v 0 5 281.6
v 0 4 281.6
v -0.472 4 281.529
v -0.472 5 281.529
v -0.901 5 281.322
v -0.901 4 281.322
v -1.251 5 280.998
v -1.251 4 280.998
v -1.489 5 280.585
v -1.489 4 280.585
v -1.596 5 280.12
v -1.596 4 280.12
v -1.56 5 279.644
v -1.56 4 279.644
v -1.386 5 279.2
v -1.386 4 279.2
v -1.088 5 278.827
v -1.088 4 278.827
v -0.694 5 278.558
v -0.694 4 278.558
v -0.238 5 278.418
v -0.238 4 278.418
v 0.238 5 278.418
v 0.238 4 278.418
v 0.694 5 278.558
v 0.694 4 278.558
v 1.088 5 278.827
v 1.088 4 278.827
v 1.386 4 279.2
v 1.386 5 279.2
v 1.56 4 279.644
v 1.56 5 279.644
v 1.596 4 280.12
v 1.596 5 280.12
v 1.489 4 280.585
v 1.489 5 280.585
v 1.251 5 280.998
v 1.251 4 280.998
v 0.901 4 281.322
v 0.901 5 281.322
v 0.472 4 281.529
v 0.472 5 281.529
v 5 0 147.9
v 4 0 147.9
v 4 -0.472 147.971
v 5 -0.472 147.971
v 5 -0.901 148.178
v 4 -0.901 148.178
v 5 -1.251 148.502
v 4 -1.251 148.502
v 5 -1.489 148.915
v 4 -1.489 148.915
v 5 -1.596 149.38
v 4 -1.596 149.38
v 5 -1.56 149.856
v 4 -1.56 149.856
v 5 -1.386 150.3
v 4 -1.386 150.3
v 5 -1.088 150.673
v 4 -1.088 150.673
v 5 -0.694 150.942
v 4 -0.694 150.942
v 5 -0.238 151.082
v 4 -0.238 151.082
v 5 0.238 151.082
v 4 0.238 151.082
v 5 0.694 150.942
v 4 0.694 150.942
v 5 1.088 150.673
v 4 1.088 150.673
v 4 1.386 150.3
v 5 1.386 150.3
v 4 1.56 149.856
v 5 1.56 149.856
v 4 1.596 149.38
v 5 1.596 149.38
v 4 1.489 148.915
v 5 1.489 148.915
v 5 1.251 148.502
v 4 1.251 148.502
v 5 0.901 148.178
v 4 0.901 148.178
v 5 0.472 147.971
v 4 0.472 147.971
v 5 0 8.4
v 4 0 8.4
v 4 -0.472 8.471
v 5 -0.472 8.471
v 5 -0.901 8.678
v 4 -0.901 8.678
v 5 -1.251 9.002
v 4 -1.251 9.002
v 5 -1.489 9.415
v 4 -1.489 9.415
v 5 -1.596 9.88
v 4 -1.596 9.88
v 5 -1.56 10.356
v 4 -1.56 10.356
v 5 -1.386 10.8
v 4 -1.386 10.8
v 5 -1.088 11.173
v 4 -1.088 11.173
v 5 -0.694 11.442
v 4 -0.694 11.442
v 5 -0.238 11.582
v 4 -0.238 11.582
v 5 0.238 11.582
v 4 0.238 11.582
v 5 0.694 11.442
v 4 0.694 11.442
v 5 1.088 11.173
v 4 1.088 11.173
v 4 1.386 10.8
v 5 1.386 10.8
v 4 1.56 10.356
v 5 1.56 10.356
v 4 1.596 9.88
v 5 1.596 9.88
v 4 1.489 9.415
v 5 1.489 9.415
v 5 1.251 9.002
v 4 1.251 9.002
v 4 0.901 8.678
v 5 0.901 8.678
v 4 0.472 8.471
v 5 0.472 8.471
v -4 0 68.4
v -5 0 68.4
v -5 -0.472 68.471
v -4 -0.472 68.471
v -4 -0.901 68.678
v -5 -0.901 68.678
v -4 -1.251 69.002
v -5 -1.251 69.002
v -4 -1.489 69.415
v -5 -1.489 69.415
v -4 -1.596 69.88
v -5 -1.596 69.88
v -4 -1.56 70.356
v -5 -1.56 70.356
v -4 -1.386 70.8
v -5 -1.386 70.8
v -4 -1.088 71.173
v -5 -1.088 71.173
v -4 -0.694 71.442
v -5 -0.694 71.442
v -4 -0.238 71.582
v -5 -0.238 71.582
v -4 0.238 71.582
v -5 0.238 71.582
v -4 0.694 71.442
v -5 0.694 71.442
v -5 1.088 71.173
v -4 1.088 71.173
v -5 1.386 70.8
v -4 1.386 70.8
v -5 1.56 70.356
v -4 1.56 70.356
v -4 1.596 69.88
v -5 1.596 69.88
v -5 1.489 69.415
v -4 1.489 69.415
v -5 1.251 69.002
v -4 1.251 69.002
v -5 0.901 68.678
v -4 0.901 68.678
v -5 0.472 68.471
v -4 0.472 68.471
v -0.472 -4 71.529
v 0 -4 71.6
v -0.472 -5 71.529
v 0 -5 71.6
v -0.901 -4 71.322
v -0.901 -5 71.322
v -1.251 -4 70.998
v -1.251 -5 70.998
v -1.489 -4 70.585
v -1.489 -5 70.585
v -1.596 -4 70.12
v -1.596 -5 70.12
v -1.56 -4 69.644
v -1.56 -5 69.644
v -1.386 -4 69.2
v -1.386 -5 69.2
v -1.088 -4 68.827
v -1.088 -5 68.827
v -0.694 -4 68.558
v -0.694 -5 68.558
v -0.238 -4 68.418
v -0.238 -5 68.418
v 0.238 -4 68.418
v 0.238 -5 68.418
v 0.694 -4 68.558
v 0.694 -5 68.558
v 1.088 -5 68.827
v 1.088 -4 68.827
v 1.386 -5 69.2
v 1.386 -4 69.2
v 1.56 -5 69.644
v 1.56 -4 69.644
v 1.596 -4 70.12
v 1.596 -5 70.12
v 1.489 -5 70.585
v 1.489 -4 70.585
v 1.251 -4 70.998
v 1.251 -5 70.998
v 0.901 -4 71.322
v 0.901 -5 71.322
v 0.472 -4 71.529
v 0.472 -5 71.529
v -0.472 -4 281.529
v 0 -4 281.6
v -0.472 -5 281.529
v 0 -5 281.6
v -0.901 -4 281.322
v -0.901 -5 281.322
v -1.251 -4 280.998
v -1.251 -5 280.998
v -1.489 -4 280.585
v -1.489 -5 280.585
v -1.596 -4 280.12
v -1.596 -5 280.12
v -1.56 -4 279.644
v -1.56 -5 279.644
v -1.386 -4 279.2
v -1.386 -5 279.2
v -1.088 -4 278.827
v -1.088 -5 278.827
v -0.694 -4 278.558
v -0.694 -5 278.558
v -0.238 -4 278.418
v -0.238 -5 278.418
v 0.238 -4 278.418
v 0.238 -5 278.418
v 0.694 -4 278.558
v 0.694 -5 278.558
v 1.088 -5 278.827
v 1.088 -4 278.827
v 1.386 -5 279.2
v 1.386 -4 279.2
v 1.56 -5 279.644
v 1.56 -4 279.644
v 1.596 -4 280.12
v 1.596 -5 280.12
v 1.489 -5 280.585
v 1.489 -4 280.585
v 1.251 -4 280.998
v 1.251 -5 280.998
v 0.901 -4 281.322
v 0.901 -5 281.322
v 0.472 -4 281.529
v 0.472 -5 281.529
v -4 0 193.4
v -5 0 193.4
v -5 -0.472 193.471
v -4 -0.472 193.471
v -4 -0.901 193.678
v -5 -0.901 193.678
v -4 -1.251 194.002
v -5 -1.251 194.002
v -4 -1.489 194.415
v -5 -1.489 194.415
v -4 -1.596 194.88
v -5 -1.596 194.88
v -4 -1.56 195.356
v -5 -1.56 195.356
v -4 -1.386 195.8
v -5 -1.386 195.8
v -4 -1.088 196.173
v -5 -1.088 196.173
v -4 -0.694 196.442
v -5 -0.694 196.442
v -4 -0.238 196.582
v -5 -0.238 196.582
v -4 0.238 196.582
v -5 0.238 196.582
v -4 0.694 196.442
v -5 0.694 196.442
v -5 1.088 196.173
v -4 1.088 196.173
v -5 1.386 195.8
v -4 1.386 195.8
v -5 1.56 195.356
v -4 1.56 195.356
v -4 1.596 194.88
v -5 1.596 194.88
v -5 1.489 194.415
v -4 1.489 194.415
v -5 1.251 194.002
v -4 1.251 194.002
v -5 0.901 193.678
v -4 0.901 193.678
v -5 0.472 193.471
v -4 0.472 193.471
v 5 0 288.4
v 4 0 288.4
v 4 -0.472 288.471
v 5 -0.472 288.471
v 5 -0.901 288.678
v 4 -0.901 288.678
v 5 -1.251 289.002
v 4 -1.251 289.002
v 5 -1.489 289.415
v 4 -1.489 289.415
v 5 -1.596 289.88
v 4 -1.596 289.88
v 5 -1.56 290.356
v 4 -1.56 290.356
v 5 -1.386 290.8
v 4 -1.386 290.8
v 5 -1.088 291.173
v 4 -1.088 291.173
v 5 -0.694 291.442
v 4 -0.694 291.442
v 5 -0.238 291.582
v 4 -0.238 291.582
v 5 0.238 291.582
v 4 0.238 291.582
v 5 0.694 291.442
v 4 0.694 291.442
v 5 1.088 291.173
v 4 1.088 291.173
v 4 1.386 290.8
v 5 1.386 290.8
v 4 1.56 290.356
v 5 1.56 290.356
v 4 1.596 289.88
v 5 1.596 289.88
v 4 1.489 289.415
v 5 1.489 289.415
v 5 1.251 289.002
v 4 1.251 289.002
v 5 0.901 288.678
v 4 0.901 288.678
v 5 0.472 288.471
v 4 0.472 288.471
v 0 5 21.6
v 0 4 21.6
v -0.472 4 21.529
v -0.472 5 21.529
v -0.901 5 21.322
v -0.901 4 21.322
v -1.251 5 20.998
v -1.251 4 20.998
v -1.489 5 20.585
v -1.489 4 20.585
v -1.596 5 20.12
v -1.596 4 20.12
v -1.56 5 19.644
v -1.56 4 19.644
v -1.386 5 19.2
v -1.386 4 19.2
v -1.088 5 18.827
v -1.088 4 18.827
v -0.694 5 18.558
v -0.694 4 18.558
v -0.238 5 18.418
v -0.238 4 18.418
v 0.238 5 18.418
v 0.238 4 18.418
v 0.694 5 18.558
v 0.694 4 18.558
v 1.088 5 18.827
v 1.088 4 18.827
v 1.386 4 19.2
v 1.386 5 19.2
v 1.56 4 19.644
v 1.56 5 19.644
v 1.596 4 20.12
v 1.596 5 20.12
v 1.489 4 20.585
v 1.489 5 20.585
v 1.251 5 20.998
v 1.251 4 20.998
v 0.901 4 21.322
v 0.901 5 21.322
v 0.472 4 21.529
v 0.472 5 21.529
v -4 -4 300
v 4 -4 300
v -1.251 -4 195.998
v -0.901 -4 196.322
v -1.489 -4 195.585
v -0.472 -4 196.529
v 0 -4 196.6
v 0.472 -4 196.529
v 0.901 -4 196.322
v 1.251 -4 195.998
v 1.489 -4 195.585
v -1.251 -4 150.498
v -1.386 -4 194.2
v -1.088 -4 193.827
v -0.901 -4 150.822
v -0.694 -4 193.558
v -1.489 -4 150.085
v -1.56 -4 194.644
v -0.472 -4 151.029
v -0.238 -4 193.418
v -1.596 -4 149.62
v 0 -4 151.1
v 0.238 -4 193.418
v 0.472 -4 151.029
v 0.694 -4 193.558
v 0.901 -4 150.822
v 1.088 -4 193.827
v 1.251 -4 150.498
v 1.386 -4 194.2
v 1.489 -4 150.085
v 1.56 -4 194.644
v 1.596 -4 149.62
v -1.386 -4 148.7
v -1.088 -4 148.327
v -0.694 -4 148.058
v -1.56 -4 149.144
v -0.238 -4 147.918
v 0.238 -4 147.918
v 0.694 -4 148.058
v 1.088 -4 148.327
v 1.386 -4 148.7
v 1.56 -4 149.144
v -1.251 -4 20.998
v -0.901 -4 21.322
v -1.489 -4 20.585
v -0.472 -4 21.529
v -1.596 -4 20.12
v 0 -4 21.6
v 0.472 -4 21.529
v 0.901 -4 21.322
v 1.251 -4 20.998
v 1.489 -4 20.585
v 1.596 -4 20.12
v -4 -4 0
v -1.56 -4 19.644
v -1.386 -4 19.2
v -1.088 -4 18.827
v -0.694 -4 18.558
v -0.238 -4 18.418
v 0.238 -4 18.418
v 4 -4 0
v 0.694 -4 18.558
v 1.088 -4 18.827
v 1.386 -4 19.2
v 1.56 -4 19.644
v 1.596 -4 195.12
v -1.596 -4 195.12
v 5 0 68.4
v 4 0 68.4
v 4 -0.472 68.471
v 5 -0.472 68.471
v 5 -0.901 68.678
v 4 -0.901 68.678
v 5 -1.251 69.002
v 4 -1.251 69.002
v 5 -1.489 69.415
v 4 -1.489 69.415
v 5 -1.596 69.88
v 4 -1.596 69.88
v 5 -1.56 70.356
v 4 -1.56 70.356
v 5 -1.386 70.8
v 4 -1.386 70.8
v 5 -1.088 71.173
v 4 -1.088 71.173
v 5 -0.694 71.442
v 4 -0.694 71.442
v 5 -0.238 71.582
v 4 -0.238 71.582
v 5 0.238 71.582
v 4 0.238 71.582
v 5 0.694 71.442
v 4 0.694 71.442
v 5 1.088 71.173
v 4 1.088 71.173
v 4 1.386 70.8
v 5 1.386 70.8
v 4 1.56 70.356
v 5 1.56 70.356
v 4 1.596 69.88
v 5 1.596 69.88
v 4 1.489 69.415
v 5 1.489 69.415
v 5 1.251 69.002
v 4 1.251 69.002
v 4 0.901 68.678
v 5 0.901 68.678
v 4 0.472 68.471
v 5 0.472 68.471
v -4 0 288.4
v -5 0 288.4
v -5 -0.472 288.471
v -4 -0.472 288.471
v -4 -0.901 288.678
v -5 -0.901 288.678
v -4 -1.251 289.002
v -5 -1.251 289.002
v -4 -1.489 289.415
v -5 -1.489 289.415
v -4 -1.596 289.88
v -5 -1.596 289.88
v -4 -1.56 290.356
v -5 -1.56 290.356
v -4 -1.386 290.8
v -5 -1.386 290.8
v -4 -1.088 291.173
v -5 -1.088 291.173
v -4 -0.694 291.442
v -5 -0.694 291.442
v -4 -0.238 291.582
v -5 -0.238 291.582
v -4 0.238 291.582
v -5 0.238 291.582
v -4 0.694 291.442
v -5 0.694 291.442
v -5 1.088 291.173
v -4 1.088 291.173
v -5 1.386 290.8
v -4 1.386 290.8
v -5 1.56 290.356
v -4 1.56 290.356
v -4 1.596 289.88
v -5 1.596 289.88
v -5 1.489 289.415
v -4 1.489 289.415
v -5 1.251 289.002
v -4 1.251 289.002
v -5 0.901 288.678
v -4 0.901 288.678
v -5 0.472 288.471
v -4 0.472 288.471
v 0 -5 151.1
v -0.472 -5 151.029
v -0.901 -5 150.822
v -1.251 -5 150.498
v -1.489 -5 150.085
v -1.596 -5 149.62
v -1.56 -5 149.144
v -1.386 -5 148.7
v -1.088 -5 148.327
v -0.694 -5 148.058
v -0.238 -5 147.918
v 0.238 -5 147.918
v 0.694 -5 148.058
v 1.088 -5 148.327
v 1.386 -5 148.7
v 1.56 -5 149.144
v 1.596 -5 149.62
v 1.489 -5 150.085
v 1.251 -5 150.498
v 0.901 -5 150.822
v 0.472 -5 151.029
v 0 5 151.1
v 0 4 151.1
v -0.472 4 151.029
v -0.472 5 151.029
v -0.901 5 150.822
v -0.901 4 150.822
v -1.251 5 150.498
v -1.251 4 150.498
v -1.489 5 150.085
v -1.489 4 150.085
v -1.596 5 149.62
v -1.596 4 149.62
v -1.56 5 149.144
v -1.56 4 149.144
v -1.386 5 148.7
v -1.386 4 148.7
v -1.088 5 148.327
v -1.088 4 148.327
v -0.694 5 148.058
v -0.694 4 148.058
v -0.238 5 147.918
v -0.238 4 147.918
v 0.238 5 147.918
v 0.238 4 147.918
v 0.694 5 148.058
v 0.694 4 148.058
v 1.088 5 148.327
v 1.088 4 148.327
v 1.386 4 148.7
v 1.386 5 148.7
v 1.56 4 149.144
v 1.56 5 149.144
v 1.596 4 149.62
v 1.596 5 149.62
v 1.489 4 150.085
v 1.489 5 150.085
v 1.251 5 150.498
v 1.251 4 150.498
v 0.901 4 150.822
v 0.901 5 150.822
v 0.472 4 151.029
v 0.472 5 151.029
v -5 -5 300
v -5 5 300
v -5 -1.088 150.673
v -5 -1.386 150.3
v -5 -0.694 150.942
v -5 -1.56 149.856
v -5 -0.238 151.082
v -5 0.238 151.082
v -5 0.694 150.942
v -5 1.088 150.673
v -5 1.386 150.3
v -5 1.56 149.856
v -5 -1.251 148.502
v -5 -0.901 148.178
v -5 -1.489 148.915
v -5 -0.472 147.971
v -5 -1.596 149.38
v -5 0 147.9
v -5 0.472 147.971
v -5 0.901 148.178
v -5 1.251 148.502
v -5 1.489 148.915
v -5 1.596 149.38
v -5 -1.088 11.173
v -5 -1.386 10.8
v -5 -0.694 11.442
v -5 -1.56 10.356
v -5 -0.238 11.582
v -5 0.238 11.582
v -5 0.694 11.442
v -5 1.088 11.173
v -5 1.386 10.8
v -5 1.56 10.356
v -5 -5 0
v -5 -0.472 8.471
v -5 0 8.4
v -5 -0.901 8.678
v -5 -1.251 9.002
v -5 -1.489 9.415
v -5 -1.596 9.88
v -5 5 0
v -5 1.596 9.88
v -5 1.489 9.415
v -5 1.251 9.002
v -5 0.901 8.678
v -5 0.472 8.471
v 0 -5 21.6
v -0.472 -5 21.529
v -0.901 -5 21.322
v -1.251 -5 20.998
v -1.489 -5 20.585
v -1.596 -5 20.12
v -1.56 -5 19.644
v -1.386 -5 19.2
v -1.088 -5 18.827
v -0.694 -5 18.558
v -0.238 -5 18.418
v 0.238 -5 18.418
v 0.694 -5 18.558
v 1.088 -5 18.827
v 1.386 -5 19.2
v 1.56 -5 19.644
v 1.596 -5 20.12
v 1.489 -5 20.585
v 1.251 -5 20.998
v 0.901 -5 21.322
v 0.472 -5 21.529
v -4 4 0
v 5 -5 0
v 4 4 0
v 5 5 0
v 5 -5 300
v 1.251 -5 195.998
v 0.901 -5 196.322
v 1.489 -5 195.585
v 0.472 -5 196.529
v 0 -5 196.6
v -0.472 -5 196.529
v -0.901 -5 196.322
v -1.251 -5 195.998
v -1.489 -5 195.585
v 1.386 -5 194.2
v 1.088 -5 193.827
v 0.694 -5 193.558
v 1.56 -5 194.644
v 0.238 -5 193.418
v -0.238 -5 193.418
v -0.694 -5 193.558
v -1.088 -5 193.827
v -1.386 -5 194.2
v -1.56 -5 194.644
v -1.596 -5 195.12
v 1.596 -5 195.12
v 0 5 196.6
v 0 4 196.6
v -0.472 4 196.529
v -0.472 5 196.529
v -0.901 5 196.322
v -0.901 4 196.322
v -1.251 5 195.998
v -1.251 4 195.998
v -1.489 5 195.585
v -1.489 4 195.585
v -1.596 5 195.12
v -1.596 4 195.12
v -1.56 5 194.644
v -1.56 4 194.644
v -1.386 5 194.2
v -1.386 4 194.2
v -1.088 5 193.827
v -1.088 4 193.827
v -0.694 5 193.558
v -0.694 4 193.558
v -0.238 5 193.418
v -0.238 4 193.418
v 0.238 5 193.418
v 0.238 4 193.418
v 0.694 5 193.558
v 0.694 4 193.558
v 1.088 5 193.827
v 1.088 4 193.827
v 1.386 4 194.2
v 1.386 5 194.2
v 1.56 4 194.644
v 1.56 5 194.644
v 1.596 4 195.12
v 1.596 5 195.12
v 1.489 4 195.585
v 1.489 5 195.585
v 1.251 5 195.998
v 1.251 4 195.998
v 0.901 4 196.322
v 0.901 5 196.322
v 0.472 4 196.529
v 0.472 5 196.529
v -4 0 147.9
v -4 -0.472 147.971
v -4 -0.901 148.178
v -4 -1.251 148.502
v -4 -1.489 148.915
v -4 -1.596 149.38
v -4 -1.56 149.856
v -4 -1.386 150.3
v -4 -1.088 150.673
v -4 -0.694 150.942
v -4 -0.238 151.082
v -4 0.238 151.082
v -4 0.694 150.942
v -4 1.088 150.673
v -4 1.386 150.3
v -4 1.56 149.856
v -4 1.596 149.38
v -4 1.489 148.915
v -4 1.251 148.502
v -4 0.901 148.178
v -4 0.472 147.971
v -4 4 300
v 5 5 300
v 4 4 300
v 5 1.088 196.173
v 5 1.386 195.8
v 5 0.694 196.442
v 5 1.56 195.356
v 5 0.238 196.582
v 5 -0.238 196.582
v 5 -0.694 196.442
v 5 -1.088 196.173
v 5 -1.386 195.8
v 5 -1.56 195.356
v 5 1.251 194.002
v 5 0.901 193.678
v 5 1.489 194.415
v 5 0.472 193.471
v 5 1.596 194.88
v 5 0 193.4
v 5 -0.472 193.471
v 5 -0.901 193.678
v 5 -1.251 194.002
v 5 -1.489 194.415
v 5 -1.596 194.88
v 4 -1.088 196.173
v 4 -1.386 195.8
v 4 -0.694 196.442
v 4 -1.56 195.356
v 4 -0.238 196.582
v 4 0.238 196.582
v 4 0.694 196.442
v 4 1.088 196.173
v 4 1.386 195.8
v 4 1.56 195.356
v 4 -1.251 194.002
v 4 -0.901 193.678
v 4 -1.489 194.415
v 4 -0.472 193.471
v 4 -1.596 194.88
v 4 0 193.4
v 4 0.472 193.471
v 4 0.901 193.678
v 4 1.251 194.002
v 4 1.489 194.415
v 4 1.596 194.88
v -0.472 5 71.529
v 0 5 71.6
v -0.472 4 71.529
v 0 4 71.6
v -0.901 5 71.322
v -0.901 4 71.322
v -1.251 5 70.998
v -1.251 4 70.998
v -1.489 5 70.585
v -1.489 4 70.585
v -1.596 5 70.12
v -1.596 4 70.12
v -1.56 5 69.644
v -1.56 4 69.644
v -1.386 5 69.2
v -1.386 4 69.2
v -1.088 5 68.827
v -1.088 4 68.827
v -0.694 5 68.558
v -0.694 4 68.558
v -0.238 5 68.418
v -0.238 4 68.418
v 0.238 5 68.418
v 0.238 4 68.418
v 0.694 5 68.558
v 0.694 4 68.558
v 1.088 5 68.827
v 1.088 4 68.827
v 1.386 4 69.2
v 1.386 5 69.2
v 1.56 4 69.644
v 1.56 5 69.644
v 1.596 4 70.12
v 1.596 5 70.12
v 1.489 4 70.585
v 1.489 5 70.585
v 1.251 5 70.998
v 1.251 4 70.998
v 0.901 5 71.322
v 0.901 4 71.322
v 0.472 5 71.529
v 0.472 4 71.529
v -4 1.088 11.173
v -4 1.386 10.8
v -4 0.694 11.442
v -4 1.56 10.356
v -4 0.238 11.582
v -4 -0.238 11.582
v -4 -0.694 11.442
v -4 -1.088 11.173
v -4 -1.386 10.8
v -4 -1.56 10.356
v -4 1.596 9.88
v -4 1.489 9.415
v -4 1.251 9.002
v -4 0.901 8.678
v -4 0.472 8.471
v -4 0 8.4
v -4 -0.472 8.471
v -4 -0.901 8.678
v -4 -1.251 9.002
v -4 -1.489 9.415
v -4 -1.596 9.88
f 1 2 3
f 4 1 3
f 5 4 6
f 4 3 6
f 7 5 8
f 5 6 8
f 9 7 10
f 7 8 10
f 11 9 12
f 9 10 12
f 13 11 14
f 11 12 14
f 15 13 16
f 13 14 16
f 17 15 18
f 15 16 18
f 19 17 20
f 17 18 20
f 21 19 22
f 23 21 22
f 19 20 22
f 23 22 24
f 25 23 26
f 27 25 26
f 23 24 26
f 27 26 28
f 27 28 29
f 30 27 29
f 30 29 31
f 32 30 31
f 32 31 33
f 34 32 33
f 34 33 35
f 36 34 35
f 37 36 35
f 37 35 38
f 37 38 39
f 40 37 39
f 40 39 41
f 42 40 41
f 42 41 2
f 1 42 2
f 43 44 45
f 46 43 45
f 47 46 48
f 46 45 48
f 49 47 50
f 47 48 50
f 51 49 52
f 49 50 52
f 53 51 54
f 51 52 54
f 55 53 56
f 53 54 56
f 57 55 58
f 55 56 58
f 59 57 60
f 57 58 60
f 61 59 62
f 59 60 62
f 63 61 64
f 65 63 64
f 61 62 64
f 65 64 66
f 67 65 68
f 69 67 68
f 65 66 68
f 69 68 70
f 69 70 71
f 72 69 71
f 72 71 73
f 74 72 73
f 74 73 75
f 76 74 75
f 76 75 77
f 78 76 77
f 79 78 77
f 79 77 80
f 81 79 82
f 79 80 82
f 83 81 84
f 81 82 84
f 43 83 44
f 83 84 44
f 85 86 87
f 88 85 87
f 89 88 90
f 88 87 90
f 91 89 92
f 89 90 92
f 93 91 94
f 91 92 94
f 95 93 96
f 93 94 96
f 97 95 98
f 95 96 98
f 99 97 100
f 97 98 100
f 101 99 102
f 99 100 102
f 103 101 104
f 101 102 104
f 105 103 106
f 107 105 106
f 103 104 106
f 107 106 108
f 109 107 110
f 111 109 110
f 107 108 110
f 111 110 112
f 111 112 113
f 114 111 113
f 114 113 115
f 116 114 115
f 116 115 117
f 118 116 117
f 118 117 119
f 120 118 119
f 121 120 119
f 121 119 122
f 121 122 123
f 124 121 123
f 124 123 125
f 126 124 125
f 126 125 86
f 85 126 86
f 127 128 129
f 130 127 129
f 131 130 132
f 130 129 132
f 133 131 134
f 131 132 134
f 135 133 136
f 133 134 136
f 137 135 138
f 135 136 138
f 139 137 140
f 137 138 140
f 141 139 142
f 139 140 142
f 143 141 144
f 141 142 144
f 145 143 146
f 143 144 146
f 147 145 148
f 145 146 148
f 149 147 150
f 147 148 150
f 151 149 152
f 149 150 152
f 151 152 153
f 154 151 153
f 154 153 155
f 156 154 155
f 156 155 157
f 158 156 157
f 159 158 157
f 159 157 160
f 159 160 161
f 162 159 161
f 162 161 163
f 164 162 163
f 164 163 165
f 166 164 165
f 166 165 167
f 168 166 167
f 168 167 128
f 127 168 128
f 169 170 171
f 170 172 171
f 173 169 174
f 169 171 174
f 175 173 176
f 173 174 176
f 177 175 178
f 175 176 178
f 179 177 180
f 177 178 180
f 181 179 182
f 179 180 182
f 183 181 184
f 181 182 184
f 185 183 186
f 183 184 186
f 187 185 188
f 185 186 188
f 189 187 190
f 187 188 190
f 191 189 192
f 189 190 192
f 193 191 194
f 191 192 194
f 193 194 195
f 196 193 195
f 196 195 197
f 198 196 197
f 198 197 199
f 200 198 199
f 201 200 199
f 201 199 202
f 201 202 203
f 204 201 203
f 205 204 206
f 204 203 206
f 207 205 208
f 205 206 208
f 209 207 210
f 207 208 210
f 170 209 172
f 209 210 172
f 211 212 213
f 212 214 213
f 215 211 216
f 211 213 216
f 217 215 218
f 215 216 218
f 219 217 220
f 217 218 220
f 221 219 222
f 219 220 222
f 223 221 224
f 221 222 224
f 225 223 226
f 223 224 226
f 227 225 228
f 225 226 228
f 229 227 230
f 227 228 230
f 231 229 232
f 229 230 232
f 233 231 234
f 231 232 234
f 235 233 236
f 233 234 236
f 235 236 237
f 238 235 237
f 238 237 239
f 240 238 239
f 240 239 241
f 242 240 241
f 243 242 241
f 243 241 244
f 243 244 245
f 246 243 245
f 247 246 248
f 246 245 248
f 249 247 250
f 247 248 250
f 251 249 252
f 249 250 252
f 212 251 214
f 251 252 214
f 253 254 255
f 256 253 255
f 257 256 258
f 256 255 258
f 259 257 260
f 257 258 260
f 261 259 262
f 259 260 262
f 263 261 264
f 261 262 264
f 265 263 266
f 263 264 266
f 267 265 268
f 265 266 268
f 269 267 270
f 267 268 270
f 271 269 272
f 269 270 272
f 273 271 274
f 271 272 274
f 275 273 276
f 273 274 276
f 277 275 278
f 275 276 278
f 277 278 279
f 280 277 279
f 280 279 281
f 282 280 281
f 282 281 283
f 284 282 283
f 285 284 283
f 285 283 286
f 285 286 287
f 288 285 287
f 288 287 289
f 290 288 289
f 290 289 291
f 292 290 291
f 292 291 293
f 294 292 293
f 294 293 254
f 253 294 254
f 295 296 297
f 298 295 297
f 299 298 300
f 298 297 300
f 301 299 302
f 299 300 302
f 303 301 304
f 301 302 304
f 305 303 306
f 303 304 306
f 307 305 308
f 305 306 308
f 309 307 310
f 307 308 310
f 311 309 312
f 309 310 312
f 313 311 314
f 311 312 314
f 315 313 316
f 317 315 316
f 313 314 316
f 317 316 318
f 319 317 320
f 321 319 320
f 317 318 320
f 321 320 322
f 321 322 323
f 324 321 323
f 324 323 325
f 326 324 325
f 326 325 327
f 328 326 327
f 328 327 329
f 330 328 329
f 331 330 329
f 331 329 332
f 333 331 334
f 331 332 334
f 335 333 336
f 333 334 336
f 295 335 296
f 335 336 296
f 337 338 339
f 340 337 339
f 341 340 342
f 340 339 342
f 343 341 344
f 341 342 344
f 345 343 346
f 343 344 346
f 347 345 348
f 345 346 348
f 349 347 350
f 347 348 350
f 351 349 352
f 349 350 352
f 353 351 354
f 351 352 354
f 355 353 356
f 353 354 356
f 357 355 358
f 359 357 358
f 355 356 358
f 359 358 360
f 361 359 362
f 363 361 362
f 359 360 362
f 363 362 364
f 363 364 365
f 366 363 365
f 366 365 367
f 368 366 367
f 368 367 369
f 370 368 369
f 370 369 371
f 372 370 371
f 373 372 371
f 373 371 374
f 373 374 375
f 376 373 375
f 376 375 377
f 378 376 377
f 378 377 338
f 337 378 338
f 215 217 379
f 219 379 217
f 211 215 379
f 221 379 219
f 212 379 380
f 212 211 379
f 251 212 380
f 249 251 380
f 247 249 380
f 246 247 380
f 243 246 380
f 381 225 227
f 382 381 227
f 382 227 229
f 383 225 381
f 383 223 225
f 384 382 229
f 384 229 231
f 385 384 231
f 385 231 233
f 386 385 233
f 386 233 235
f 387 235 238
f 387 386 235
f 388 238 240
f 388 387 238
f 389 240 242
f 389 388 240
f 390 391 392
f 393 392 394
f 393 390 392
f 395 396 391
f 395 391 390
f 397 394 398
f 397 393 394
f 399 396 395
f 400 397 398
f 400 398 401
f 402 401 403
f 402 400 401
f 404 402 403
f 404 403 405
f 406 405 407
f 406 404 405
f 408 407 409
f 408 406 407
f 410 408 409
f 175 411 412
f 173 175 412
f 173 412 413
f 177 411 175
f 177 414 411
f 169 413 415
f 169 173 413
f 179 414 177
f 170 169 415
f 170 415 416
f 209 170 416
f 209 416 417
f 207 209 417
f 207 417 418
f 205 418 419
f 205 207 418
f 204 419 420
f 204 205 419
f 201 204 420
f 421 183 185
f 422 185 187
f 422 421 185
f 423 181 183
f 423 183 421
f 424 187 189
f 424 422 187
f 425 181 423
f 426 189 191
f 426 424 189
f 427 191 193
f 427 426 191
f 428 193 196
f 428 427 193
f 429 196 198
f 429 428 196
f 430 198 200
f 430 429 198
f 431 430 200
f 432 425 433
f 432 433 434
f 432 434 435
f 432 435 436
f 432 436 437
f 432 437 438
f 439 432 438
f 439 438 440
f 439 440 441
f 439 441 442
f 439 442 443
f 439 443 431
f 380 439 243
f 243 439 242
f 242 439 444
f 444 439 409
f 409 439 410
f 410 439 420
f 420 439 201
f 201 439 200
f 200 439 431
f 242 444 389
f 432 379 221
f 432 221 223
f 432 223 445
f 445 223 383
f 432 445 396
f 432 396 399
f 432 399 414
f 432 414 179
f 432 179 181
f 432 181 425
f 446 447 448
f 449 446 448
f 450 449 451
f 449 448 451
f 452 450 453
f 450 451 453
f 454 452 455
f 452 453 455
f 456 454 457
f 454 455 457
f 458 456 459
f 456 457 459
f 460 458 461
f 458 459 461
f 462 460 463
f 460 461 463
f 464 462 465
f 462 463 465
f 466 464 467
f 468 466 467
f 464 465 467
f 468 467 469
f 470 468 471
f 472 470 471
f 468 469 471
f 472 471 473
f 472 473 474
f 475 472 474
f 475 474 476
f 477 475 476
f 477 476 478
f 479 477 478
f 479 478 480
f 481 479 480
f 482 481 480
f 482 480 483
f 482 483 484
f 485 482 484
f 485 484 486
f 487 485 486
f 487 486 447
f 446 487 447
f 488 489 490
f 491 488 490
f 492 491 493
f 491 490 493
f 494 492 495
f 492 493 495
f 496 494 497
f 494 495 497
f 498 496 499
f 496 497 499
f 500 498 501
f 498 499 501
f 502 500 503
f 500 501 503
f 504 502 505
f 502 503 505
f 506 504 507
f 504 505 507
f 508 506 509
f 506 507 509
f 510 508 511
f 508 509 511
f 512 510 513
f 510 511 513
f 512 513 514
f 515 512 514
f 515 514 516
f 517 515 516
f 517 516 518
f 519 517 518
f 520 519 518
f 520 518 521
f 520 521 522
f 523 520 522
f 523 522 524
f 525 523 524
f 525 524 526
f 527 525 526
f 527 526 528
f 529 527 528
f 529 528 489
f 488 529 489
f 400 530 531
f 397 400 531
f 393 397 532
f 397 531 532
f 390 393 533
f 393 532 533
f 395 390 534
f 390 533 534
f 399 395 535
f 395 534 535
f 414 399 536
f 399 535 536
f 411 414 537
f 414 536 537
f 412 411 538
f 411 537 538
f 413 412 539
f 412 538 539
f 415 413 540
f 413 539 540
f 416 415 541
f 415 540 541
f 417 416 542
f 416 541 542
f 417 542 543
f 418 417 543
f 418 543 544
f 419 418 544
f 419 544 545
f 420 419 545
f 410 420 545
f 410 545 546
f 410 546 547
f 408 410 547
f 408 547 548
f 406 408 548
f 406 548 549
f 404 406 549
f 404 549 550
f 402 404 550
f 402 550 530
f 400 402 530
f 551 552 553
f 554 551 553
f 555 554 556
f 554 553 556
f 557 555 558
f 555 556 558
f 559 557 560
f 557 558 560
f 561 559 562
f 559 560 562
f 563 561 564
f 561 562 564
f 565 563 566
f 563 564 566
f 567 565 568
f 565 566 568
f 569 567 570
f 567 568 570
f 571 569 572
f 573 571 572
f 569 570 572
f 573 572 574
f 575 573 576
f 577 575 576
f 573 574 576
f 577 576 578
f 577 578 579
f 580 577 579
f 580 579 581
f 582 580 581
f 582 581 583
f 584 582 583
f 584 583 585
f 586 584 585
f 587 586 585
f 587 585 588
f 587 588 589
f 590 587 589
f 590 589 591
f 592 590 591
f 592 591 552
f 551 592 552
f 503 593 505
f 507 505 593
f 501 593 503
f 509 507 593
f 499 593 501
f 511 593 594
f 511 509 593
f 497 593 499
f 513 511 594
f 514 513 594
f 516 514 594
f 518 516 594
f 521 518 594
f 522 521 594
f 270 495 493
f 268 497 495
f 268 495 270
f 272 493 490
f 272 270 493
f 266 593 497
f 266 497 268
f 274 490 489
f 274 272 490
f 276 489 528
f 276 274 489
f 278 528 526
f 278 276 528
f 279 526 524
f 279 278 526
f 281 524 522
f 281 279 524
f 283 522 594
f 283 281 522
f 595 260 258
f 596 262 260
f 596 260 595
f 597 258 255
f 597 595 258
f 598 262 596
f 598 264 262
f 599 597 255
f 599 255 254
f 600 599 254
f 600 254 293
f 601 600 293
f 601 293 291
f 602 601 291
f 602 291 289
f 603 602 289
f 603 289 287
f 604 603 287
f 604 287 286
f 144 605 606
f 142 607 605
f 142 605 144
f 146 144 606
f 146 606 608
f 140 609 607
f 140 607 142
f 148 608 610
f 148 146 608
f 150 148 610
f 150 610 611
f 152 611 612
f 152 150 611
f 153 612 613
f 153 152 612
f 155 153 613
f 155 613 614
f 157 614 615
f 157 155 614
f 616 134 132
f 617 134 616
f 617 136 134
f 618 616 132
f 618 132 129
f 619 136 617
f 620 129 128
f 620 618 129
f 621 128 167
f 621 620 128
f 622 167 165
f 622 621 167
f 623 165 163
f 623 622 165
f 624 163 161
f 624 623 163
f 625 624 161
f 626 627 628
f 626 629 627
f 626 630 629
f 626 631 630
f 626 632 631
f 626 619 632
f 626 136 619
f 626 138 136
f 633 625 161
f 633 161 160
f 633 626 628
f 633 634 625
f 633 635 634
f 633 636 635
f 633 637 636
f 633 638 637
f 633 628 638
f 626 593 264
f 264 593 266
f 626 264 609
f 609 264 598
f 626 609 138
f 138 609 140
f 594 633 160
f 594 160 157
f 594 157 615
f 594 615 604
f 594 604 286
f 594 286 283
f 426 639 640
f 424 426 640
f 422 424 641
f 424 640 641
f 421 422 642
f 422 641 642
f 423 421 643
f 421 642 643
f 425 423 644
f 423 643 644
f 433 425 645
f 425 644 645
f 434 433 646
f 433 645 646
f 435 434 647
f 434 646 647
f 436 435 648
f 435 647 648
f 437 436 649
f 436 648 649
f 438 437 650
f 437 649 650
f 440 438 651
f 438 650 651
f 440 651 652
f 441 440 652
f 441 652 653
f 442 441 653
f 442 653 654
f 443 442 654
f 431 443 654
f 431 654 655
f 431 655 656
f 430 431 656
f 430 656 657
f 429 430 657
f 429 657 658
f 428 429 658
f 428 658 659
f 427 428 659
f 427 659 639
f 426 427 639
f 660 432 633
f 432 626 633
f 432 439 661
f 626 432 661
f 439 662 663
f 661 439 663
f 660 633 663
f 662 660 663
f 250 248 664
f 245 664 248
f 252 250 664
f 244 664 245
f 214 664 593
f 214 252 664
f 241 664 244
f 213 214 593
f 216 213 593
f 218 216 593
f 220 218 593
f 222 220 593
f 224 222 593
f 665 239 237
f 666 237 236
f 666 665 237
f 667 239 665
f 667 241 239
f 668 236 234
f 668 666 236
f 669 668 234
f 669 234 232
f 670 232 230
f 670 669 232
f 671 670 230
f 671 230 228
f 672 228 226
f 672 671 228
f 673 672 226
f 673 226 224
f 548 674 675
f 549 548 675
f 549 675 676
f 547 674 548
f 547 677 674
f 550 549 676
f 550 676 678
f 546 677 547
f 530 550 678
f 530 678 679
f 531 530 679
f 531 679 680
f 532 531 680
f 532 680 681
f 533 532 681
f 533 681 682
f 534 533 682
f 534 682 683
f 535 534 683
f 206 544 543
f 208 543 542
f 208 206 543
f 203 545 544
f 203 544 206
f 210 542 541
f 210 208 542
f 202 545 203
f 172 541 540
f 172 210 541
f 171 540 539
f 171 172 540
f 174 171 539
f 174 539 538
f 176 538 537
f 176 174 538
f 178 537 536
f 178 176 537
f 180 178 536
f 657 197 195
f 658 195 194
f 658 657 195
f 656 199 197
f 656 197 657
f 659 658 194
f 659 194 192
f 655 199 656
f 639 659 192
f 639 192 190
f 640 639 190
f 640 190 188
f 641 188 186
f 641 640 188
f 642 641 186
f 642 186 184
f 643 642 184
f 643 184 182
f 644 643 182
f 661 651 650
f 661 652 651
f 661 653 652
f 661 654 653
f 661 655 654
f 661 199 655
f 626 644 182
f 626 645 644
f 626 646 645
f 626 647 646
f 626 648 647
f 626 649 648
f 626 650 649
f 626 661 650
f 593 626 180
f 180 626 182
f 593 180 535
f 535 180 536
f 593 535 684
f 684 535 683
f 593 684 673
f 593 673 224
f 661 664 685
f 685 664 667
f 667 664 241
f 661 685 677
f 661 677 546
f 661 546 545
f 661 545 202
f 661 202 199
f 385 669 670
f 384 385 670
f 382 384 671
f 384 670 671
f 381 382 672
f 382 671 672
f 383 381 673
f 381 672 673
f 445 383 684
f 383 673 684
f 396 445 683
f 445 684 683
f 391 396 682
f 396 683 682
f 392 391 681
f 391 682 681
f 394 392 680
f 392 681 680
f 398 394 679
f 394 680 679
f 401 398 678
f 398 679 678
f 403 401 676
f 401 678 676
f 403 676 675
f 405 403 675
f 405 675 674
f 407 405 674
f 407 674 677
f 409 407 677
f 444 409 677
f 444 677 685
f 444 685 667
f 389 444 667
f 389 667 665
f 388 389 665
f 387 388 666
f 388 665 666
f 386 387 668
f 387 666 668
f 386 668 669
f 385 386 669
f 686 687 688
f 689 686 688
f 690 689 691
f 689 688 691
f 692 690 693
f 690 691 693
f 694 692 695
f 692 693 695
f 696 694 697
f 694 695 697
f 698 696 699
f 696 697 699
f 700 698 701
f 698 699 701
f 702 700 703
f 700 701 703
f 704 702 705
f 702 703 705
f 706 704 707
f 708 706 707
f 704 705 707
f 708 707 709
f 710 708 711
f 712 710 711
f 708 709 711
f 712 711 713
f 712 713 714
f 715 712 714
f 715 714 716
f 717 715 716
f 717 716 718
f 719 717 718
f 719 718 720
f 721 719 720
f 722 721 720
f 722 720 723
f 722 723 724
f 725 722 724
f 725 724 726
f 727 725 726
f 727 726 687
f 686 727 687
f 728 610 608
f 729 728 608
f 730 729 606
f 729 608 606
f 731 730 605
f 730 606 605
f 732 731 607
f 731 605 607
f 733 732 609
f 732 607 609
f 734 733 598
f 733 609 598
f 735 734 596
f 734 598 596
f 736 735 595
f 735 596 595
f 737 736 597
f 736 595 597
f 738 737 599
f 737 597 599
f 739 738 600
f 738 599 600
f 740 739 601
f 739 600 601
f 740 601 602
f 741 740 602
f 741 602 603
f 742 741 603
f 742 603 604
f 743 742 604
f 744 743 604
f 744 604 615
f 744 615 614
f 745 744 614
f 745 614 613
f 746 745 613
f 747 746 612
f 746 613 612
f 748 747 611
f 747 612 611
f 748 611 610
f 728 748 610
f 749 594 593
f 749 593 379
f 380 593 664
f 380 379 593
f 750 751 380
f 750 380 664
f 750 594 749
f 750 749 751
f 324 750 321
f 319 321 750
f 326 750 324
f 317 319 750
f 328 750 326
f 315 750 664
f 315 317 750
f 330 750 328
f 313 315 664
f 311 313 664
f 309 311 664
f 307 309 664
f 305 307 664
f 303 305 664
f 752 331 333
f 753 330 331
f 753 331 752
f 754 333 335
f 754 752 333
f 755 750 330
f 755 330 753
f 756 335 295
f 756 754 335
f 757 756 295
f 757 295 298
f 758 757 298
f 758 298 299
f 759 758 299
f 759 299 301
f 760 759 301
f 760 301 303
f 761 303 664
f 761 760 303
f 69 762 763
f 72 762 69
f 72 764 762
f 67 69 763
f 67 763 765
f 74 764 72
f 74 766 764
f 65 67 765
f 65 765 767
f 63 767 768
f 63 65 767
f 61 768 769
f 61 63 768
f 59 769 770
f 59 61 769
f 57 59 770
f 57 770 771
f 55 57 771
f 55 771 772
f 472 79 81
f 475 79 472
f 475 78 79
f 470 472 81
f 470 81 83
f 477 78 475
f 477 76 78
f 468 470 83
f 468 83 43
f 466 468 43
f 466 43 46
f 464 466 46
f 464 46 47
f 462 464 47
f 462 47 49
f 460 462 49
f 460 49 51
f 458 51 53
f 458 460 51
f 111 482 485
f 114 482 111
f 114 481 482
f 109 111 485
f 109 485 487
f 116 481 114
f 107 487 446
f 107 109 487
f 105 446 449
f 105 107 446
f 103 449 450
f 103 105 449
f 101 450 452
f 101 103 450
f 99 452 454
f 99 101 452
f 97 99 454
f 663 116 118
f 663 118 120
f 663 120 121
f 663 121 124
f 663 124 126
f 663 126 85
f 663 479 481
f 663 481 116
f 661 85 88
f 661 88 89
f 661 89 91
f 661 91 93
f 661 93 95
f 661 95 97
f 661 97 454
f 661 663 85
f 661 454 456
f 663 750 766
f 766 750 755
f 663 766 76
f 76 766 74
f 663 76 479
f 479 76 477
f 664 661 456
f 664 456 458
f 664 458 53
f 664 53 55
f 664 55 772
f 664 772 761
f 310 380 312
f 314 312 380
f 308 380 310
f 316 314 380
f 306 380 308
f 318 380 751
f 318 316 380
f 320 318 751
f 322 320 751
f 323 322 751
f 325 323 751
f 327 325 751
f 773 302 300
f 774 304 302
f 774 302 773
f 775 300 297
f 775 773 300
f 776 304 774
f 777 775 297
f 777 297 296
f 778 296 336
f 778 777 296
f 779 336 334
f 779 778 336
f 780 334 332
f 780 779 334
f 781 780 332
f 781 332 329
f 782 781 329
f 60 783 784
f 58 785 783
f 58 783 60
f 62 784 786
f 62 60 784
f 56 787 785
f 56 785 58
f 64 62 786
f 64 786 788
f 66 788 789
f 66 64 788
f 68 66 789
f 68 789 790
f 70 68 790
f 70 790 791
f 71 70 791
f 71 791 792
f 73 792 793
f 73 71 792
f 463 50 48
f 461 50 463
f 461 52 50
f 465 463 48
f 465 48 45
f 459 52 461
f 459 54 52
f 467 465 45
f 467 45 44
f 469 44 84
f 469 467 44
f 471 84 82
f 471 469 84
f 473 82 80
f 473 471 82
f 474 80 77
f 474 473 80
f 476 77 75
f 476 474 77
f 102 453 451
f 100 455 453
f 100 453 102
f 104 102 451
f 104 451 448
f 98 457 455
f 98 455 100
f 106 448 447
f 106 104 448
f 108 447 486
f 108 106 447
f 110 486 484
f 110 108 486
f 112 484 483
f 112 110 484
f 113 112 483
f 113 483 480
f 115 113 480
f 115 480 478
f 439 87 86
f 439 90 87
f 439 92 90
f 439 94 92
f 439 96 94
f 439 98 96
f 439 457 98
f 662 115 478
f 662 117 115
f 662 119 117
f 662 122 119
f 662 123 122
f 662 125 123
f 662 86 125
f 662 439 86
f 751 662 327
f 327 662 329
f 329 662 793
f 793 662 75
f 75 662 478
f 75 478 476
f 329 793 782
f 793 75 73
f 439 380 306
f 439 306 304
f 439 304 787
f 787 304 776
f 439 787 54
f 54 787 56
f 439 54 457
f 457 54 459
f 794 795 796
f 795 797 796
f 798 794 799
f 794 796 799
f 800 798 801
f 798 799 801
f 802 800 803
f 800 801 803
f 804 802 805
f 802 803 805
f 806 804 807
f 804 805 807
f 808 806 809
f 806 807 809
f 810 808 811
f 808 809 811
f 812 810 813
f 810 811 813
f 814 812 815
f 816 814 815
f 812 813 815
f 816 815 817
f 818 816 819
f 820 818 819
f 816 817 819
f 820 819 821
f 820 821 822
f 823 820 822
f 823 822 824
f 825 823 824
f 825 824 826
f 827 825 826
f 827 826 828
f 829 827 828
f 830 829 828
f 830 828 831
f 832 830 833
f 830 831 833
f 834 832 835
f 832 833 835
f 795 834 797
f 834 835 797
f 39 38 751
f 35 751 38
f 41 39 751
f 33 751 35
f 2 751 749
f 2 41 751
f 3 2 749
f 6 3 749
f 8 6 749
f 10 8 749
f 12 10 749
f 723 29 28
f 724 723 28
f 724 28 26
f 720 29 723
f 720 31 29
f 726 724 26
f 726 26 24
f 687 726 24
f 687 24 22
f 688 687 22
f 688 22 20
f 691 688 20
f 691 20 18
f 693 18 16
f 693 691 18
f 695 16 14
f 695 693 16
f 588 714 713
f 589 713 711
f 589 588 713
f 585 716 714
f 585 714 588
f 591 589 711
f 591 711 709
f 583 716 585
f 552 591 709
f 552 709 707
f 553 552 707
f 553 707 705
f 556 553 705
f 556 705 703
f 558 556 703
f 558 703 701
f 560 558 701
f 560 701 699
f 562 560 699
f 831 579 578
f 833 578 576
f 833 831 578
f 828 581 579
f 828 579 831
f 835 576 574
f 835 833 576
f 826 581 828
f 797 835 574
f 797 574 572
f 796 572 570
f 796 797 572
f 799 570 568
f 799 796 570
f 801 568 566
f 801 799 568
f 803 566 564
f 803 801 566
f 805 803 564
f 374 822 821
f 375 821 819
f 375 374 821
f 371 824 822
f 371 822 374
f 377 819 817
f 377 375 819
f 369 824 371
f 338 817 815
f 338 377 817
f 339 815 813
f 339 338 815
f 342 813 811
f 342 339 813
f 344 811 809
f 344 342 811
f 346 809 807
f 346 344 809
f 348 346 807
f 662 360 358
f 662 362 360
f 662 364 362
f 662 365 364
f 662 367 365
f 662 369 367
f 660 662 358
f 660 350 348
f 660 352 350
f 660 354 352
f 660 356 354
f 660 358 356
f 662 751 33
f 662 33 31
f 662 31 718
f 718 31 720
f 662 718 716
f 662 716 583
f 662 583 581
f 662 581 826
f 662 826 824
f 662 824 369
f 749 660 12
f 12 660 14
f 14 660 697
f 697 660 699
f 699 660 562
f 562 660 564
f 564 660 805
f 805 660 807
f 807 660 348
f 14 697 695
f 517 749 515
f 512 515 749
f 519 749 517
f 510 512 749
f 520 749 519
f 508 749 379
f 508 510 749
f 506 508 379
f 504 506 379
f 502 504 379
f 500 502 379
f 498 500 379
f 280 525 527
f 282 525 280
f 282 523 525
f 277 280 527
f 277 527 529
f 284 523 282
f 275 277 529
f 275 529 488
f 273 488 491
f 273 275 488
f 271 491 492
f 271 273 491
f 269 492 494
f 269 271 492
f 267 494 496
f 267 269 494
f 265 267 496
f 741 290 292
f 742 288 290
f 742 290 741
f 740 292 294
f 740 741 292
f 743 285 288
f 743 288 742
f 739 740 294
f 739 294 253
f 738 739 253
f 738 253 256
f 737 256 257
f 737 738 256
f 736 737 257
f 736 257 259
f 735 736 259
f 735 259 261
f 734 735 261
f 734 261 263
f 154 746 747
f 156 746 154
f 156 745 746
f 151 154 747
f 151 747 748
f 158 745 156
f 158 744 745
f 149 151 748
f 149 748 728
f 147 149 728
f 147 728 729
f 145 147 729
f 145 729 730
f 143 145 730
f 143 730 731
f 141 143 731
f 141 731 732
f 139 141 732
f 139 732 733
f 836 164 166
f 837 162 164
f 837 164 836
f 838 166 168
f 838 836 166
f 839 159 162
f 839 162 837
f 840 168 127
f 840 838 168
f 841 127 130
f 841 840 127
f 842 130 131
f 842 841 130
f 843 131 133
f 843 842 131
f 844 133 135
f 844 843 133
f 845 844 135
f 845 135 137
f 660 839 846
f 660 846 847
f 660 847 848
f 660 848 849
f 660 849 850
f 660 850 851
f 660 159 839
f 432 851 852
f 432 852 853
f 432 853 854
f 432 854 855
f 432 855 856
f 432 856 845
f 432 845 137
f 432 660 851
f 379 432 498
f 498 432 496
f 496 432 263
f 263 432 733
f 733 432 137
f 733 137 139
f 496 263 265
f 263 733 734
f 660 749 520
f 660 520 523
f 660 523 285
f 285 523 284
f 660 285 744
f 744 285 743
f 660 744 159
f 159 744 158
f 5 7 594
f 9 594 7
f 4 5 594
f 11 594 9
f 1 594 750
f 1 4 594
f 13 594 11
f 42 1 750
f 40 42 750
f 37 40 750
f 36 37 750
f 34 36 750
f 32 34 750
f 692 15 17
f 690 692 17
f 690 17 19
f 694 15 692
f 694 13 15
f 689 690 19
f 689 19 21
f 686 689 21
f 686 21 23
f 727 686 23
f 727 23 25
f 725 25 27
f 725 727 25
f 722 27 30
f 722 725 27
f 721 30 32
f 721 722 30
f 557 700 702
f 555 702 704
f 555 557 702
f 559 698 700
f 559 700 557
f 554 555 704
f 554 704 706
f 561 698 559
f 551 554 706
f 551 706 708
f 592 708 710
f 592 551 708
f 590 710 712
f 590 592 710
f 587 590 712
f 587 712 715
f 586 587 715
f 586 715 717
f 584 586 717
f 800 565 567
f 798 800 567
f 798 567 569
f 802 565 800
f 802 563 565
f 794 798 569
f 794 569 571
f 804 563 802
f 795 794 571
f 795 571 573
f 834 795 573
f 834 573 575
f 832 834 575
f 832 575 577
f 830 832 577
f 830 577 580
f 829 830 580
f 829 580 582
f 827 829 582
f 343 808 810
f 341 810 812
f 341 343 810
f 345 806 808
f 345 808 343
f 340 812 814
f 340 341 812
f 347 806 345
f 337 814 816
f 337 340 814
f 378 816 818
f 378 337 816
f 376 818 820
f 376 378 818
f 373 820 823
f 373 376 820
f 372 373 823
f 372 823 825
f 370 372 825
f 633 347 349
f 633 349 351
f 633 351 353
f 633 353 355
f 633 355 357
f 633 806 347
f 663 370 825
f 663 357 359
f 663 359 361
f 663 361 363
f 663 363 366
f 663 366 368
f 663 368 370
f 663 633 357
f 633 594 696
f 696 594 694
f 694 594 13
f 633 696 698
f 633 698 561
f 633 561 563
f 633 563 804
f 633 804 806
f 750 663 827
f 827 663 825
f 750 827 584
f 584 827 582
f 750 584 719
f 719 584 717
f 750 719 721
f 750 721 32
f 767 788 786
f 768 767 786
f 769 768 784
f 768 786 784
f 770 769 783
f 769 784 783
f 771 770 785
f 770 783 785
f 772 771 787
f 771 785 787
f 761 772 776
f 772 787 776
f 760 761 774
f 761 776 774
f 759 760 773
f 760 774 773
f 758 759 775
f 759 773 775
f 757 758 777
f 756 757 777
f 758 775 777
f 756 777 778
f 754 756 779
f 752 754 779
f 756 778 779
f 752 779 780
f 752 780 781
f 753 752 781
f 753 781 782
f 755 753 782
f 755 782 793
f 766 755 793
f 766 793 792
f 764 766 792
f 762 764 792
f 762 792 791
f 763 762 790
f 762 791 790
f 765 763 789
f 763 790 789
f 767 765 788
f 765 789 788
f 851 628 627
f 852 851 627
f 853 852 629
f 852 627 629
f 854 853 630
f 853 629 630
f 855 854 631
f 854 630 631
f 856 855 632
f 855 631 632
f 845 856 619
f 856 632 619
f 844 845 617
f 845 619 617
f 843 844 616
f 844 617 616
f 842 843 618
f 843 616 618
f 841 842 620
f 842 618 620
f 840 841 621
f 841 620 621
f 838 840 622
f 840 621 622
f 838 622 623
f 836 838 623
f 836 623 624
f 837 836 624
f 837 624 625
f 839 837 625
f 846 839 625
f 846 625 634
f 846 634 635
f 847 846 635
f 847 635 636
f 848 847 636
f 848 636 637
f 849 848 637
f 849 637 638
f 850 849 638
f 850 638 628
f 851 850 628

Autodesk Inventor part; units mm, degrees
ref_plane "YZ Plane" through (0, 0, 0) normal (1, 0, 0) x (0, 1, 0)
ref_plane "XZ Plane" through (0, 0, 0) normal (0, 1, 0) x (-1, 0, 0)
ref_plane "XY Plane" through (0, 0, 0) normal (0, 0, 1) x (1, 0, 0)
sketch "スケッチ1" plane through (0, 0, 0) normal (0, 0, 1) x (1, 0, 0)
  line L0 (5, -5) -> (-5, -5)
  line L1 (-5, -5) -> (-5, 5)
  line L2 (-5, 5) -> (5, 5)
  line L3 (5, 5) -> (5, -5)
  line L4 (5, -5) -> (-5, 5) construction
  line L5 (-5, -5) -> (5, 5) construction
  line L6 (4, 4) -> (-4, 4)
  line L7 (-4, 4) -> (-4, -4)
  line L8 (-4, -4) -> (4, -4)
  line L9 (4, -4) -> (4, 4)
  point P0 (0, 0)
  dimension "d0" = 10
  dimension "d1" = 10
  dimension "d2" = 1
extrude "押し出し1" add sketch "スケッチ1" along normal blind 300
sketch "スケッチ2" plane through (5, -5, 0) normal (1, 0, 0) x (0, 0, -1)
  line L0 (0, 5) -> (-300, 5)
  line L1 (0, 1) -> (-300, 1) projected
  line L2 (0, 0) -> (0, 10) projected
  line L3 (-300, 0) -> (-300, 10) projected
  point P0 (-195, 5)
  point P1 (-70, 5)
  point P2 (-150, 5)
  point P3 (-290, 5)
  point P4 (-10, 5)
  point P5 (-149.5, 5)
  dimension "d6" = 125
  dimension "d26" = 80
  dimension "d28" = 10
  dimension "d29" = 10
  dimension "d30" = 280
  dimension "d35" = 79.5
hole "穴1" at (5, 0, 195) at (5, 0, 70) at (5, 0, 290) at (5, 0, 10) at (5, 0, 149.5) direction (-1, 0, 0) diameter 3.2 end through all
sketch "スケッチ3" plane through (-5, 5, 0) normal (0, 1, 0) x (1, 0, 0)
  line L0 (5, 0) -> (5, -300)
  line L1 (10, -300) -> (0, -300) projected
  line L2 (10, 0) -> (0, 0) projected
  point P0 (5, -195)
  point P1 (5, -70)
  point P2 (5, -149.5)
  point P3 (5, -150)
  point P4 (5, -20)
  point P5 (5, -280)
  dimension "d15" = 125
  dimension "d27" = 80
  dimension "d31" = 20
  dimension "d32" = 20
  dimension "d33" = 79.5
  dimension "d34" = 50
hole "穴2" at (0, 5, 195) at (0, 5, 70) at (0, 5, 149.5) at (0, 5, 20) at (0, 5, 280) direction (0, -1, 0) diameter 3.2 end through all
equation "\"d32\" = d31"
properties part number "kaku_1010_145"
